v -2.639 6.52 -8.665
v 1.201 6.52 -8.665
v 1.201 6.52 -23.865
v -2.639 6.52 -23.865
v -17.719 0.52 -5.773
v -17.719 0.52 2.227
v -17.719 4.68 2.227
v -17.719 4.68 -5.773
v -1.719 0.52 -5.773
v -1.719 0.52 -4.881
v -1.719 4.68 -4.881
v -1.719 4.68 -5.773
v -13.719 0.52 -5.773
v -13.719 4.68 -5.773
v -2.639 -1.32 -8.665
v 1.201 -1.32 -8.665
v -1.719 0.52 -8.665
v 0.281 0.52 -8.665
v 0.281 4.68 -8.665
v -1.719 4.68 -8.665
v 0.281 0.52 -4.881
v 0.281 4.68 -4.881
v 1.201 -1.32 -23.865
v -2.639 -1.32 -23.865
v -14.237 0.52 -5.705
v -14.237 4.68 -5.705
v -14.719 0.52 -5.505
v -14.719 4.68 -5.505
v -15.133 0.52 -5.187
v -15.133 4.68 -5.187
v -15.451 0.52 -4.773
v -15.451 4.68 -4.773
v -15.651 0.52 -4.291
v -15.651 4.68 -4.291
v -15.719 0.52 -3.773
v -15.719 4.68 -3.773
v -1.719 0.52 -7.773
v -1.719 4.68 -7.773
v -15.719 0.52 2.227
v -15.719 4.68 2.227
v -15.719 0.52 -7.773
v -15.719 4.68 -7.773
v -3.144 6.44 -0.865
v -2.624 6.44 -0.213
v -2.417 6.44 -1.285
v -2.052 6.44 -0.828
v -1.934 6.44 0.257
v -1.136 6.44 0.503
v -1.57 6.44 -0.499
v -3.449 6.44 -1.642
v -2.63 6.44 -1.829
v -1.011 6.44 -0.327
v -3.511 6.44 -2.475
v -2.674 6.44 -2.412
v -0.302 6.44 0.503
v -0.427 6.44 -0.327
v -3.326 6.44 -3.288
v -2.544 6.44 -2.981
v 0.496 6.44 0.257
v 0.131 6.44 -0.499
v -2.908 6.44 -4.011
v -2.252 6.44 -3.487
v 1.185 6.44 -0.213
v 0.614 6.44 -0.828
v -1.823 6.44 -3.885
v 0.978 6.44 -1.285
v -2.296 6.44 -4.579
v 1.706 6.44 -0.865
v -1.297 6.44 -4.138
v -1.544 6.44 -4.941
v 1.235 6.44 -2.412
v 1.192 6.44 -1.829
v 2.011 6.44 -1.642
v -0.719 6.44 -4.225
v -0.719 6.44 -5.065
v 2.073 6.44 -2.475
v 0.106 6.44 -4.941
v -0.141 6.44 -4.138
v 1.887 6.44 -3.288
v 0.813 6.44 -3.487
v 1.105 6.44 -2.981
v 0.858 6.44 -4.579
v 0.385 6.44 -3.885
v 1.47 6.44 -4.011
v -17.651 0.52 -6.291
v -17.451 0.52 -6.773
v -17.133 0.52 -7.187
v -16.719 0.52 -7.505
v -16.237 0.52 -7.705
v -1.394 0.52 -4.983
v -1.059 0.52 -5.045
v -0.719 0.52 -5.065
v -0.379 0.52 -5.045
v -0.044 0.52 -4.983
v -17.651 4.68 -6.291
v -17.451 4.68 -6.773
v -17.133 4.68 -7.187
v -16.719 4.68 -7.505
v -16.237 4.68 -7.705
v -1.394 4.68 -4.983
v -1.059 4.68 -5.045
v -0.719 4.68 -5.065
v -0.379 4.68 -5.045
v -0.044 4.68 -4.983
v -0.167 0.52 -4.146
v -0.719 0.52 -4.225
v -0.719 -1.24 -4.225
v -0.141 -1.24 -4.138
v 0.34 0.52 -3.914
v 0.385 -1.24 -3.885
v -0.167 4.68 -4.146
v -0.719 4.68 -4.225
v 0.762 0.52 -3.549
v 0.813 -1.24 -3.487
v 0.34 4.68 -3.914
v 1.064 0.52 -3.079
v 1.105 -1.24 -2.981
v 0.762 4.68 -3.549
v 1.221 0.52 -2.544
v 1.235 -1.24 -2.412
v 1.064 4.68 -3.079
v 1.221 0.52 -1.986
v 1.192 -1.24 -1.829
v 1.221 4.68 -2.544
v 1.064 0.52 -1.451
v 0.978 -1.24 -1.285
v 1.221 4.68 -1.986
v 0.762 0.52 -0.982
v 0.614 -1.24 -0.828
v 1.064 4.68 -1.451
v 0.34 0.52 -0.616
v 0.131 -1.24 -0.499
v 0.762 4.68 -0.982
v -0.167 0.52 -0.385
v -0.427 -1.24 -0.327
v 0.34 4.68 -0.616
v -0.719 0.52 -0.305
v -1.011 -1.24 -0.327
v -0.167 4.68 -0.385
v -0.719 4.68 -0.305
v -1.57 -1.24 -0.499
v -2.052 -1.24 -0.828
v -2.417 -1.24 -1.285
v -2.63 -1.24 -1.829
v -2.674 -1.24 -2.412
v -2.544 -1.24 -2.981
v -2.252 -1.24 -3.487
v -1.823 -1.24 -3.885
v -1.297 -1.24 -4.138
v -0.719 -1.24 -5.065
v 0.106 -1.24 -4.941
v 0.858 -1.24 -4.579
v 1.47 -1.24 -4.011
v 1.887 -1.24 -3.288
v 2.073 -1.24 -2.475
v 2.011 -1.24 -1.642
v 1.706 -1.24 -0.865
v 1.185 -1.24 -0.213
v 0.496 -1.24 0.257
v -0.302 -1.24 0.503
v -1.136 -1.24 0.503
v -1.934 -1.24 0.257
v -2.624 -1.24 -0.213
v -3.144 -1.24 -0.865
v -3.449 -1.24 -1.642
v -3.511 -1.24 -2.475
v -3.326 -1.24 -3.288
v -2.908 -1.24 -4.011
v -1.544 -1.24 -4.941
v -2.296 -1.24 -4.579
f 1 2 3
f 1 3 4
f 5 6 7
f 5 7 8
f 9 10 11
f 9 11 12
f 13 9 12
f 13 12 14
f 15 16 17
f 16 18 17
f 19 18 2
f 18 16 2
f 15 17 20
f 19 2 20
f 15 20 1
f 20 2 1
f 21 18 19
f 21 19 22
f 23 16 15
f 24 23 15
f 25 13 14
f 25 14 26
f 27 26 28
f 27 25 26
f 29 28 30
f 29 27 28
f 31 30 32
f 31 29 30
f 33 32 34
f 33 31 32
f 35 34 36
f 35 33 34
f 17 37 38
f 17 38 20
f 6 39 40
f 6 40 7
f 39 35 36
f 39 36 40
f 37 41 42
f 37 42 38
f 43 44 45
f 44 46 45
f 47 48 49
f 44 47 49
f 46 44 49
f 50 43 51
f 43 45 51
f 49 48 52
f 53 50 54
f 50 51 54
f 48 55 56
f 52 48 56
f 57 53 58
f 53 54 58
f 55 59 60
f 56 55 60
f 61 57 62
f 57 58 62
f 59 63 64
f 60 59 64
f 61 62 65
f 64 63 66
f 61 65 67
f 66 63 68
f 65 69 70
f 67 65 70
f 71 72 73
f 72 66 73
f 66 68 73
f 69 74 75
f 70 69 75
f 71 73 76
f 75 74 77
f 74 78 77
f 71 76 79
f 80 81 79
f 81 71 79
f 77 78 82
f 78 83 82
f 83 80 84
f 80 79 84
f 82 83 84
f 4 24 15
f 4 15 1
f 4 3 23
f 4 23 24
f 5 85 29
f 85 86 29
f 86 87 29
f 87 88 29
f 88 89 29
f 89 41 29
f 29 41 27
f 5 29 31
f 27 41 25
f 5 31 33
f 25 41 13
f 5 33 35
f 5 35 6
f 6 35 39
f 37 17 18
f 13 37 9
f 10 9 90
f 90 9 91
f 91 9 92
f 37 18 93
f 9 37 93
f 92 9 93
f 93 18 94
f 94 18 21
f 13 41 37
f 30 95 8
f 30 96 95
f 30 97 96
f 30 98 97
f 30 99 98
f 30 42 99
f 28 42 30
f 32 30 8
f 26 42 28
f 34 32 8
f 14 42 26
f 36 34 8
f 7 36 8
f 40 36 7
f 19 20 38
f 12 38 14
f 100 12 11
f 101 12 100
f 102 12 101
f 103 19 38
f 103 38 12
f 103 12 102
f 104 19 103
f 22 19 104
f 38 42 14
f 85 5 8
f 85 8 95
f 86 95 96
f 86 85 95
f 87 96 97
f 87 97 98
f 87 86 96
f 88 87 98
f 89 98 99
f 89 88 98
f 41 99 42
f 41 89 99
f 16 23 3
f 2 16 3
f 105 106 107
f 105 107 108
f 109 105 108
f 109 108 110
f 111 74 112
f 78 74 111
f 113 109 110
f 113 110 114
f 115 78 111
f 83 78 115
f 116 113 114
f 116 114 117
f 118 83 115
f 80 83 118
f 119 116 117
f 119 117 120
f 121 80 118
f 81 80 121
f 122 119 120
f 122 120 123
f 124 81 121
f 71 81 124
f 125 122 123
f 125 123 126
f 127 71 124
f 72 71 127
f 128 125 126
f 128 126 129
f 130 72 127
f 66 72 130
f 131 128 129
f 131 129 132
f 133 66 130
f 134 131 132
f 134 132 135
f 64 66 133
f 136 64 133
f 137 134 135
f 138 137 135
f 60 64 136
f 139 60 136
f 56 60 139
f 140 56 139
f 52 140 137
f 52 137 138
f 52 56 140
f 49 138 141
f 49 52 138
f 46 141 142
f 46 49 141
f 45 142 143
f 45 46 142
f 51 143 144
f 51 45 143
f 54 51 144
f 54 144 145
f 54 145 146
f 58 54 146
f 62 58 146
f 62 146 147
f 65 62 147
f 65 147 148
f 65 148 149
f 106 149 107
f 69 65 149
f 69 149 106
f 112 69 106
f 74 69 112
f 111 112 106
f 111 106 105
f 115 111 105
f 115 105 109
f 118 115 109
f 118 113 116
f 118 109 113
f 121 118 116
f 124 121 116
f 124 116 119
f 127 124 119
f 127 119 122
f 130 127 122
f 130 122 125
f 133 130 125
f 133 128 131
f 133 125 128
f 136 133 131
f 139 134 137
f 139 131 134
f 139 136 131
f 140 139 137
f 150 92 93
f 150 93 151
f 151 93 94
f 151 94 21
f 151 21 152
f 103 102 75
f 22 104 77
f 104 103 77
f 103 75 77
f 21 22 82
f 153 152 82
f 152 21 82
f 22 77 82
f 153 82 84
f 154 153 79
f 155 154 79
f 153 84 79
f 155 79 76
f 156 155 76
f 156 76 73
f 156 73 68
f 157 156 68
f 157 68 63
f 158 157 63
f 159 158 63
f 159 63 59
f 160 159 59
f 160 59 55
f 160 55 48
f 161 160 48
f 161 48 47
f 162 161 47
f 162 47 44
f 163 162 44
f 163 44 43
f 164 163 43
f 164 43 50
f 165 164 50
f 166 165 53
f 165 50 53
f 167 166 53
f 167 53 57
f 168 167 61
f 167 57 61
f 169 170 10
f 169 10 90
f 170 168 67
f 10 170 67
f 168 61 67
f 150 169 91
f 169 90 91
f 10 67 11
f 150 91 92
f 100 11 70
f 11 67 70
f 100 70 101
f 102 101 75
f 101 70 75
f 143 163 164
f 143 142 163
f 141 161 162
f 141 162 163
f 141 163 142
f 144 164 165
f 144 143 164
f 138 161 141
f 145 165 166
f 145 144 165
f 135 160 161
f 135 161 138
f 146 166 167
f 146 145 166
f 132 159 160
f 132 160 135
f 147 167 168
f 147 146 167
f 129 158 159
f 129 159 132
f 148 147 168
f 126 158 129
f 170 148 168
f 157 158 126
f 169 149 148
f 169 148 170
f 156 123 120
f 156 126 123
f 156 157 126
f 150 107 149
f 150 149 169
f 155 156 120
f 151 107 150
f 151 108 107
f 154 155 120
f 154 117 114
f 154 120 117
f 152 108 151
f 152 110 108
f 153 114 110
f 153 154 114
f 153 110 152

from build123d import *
from build123d.topology import SkipClean

# Parameters (mm, degrees)
SKETCH1_R                = 3.5
SKETCH1_R_2              = 2.45
HOLE_DEPTH               = 5.2
SKETCH2_W                = 2.5
SKETCH2_H                = 4.5
BOSS_EXTRUDE2_DEPTH      = 5.2
SKETCH3_W                = 4.8
SKETCH3_H                = 9.8
BOSS_EXTRUDE3_DEPTH      = 19
LEVER_ARM_DEPTH          = 5.2
BOSS_EXTRUDE4_DEPTH      = 2.2
BOSS_EXTRUDE4_DEPTH_BACK = 7.4
SKETCH6_R                = 3.5
SKETCH6_R_2              = 2.45
SCALE1_SCALE             = 0.8


with BuildPart() as part:
    # Sketch1 → hole (new body)
    with BuildSketch(Plane(origin=(0, 0, 0), x_dir=(1, 0, 0), z_dir=(0, 1, 0))):
        with Locations(Location((0, 0, 0), (0, 0, 270))):
            Circle(SKETCH1_R)
        with Locations(Location((0, 0, 0), (0, 0, 270))):
            Circle(SKETCH1_R_2, mode=Mode.SUBTRACT)
    extrude(amount=HOLE_DEPTH)

    # Sketch2 → Boss-Extrude2 (add)
    with BuildSketch(Plane.XZ):
        with Locations((0, -5.75)):
            Rectangle(SKETCH2_W, SKETCH2_H)
        with BuildLine():
            ThreePointArc((1.25, -3.269174208), (0.635566784, -3.441809824), (0, -3.5))
            Line((0, -3.5), (1.25, -3.5))
            Line((1.25, -3.5), (1.25, -3.269174208))
        make_face()
        with BuildLine():
            Line((-1.25, -3.269174208), (-1.25, -3.5))
            Line((-1.25, -3.5), (0, -3.5))
            ThreePointArc((0, -3.5), (-0.635566784, -3.441809824), (-1.25, -3.269174208))
        make_face()
    extrude(amount=-BOSS_EXTRUDE2_DEPTH)

    # Sketch3 → Boss-Extrude3 (add)
    with BuildSketch(Plane(origin=(0, 0, -8), x_dir=(-1, 0, 0), z_dir=(0, 0, -1))):
        with Locations((0, 2.6)):
            Rectangle(SKETCH3_W, SKETCH3_H)
    extrude(amount=BOSS_EXTRUDE3_DEPTH)

    # Sketch5 → lever arm (add)
    with BuildSketch(Plane.XZ):
        Polygon((-18.75, -6.884587104), (-1.25, -6.884587104), (-1.25, -4.384587104), (-16.25, -4.384587104), (-18.75, -4.384587104), align=None)
        with BuildLine():
            ThreePointArc((-21.25, -4.384587104), (-20.517766953, -6.152354057), (-18.75, -6.884587104))
            Line((-18.75, -6.884587104), (-18.75, -4.384587104))
            Line((-18.75, -4.384587104), (-21.25, -4.384587104))
        make_face()
        with BuildLine():
            Line((-18.75, -1.884587104), (-18.75, -4.384587104))
            Line((-18.75, -4.384587104), (-16.25, -4.384587104))
            ThreePointArc((-16.25, -4.384587104), (-18.017766953, -3.652354057), (-18.75, -1.884587104))
        make_face()
        Polygon((-21.25, -4.384587104), (-18.75, -4.384587104), (-18.75, -1.884587104), (-18.75, 5.615412896), (-21.25, 5.615412896), align=None)
    extrude(amount=-LEVER_ARM_DEPTH)

    # Sketch6 → Boss-Extrude4 (add, two sides: drawn at the far end of the back side and taken through both)
    with SkipClean():  # the faces are left unmerged after this step: merging them gives an invalid solid
        with BuildSketch(Plane.XZ.offset(-BOSS_EXTRUDE4_DEPTH_BACK)):
            with Locations(Location((0, 0, 0), (0, 0, 270))):
                Circle(SKETCH6_R)
            with Locations(Location((0, 0, 0), (0, 0, 270))):
                Circle(SKETCH6_R_2, mode=Mode.SUBTRACT)
        extrude(amount=BOSS_EXTRUDE4_DEPTH + BOSS_EXTRUDE4_DEPTH_BACK)
    add(part.part.scale(1), mode=Mode.REPLACE)  # the faces are merged on a copy


with BuildPart() as part_1:
    # Scale1: scaled about (-3.5957974, 2.6, -11.326296727)
    add(part.part.scale(SCALE1_SCALE).moved(Location((-0.71915948, 0.52, -2.265259345))))


solid = part_1.part
